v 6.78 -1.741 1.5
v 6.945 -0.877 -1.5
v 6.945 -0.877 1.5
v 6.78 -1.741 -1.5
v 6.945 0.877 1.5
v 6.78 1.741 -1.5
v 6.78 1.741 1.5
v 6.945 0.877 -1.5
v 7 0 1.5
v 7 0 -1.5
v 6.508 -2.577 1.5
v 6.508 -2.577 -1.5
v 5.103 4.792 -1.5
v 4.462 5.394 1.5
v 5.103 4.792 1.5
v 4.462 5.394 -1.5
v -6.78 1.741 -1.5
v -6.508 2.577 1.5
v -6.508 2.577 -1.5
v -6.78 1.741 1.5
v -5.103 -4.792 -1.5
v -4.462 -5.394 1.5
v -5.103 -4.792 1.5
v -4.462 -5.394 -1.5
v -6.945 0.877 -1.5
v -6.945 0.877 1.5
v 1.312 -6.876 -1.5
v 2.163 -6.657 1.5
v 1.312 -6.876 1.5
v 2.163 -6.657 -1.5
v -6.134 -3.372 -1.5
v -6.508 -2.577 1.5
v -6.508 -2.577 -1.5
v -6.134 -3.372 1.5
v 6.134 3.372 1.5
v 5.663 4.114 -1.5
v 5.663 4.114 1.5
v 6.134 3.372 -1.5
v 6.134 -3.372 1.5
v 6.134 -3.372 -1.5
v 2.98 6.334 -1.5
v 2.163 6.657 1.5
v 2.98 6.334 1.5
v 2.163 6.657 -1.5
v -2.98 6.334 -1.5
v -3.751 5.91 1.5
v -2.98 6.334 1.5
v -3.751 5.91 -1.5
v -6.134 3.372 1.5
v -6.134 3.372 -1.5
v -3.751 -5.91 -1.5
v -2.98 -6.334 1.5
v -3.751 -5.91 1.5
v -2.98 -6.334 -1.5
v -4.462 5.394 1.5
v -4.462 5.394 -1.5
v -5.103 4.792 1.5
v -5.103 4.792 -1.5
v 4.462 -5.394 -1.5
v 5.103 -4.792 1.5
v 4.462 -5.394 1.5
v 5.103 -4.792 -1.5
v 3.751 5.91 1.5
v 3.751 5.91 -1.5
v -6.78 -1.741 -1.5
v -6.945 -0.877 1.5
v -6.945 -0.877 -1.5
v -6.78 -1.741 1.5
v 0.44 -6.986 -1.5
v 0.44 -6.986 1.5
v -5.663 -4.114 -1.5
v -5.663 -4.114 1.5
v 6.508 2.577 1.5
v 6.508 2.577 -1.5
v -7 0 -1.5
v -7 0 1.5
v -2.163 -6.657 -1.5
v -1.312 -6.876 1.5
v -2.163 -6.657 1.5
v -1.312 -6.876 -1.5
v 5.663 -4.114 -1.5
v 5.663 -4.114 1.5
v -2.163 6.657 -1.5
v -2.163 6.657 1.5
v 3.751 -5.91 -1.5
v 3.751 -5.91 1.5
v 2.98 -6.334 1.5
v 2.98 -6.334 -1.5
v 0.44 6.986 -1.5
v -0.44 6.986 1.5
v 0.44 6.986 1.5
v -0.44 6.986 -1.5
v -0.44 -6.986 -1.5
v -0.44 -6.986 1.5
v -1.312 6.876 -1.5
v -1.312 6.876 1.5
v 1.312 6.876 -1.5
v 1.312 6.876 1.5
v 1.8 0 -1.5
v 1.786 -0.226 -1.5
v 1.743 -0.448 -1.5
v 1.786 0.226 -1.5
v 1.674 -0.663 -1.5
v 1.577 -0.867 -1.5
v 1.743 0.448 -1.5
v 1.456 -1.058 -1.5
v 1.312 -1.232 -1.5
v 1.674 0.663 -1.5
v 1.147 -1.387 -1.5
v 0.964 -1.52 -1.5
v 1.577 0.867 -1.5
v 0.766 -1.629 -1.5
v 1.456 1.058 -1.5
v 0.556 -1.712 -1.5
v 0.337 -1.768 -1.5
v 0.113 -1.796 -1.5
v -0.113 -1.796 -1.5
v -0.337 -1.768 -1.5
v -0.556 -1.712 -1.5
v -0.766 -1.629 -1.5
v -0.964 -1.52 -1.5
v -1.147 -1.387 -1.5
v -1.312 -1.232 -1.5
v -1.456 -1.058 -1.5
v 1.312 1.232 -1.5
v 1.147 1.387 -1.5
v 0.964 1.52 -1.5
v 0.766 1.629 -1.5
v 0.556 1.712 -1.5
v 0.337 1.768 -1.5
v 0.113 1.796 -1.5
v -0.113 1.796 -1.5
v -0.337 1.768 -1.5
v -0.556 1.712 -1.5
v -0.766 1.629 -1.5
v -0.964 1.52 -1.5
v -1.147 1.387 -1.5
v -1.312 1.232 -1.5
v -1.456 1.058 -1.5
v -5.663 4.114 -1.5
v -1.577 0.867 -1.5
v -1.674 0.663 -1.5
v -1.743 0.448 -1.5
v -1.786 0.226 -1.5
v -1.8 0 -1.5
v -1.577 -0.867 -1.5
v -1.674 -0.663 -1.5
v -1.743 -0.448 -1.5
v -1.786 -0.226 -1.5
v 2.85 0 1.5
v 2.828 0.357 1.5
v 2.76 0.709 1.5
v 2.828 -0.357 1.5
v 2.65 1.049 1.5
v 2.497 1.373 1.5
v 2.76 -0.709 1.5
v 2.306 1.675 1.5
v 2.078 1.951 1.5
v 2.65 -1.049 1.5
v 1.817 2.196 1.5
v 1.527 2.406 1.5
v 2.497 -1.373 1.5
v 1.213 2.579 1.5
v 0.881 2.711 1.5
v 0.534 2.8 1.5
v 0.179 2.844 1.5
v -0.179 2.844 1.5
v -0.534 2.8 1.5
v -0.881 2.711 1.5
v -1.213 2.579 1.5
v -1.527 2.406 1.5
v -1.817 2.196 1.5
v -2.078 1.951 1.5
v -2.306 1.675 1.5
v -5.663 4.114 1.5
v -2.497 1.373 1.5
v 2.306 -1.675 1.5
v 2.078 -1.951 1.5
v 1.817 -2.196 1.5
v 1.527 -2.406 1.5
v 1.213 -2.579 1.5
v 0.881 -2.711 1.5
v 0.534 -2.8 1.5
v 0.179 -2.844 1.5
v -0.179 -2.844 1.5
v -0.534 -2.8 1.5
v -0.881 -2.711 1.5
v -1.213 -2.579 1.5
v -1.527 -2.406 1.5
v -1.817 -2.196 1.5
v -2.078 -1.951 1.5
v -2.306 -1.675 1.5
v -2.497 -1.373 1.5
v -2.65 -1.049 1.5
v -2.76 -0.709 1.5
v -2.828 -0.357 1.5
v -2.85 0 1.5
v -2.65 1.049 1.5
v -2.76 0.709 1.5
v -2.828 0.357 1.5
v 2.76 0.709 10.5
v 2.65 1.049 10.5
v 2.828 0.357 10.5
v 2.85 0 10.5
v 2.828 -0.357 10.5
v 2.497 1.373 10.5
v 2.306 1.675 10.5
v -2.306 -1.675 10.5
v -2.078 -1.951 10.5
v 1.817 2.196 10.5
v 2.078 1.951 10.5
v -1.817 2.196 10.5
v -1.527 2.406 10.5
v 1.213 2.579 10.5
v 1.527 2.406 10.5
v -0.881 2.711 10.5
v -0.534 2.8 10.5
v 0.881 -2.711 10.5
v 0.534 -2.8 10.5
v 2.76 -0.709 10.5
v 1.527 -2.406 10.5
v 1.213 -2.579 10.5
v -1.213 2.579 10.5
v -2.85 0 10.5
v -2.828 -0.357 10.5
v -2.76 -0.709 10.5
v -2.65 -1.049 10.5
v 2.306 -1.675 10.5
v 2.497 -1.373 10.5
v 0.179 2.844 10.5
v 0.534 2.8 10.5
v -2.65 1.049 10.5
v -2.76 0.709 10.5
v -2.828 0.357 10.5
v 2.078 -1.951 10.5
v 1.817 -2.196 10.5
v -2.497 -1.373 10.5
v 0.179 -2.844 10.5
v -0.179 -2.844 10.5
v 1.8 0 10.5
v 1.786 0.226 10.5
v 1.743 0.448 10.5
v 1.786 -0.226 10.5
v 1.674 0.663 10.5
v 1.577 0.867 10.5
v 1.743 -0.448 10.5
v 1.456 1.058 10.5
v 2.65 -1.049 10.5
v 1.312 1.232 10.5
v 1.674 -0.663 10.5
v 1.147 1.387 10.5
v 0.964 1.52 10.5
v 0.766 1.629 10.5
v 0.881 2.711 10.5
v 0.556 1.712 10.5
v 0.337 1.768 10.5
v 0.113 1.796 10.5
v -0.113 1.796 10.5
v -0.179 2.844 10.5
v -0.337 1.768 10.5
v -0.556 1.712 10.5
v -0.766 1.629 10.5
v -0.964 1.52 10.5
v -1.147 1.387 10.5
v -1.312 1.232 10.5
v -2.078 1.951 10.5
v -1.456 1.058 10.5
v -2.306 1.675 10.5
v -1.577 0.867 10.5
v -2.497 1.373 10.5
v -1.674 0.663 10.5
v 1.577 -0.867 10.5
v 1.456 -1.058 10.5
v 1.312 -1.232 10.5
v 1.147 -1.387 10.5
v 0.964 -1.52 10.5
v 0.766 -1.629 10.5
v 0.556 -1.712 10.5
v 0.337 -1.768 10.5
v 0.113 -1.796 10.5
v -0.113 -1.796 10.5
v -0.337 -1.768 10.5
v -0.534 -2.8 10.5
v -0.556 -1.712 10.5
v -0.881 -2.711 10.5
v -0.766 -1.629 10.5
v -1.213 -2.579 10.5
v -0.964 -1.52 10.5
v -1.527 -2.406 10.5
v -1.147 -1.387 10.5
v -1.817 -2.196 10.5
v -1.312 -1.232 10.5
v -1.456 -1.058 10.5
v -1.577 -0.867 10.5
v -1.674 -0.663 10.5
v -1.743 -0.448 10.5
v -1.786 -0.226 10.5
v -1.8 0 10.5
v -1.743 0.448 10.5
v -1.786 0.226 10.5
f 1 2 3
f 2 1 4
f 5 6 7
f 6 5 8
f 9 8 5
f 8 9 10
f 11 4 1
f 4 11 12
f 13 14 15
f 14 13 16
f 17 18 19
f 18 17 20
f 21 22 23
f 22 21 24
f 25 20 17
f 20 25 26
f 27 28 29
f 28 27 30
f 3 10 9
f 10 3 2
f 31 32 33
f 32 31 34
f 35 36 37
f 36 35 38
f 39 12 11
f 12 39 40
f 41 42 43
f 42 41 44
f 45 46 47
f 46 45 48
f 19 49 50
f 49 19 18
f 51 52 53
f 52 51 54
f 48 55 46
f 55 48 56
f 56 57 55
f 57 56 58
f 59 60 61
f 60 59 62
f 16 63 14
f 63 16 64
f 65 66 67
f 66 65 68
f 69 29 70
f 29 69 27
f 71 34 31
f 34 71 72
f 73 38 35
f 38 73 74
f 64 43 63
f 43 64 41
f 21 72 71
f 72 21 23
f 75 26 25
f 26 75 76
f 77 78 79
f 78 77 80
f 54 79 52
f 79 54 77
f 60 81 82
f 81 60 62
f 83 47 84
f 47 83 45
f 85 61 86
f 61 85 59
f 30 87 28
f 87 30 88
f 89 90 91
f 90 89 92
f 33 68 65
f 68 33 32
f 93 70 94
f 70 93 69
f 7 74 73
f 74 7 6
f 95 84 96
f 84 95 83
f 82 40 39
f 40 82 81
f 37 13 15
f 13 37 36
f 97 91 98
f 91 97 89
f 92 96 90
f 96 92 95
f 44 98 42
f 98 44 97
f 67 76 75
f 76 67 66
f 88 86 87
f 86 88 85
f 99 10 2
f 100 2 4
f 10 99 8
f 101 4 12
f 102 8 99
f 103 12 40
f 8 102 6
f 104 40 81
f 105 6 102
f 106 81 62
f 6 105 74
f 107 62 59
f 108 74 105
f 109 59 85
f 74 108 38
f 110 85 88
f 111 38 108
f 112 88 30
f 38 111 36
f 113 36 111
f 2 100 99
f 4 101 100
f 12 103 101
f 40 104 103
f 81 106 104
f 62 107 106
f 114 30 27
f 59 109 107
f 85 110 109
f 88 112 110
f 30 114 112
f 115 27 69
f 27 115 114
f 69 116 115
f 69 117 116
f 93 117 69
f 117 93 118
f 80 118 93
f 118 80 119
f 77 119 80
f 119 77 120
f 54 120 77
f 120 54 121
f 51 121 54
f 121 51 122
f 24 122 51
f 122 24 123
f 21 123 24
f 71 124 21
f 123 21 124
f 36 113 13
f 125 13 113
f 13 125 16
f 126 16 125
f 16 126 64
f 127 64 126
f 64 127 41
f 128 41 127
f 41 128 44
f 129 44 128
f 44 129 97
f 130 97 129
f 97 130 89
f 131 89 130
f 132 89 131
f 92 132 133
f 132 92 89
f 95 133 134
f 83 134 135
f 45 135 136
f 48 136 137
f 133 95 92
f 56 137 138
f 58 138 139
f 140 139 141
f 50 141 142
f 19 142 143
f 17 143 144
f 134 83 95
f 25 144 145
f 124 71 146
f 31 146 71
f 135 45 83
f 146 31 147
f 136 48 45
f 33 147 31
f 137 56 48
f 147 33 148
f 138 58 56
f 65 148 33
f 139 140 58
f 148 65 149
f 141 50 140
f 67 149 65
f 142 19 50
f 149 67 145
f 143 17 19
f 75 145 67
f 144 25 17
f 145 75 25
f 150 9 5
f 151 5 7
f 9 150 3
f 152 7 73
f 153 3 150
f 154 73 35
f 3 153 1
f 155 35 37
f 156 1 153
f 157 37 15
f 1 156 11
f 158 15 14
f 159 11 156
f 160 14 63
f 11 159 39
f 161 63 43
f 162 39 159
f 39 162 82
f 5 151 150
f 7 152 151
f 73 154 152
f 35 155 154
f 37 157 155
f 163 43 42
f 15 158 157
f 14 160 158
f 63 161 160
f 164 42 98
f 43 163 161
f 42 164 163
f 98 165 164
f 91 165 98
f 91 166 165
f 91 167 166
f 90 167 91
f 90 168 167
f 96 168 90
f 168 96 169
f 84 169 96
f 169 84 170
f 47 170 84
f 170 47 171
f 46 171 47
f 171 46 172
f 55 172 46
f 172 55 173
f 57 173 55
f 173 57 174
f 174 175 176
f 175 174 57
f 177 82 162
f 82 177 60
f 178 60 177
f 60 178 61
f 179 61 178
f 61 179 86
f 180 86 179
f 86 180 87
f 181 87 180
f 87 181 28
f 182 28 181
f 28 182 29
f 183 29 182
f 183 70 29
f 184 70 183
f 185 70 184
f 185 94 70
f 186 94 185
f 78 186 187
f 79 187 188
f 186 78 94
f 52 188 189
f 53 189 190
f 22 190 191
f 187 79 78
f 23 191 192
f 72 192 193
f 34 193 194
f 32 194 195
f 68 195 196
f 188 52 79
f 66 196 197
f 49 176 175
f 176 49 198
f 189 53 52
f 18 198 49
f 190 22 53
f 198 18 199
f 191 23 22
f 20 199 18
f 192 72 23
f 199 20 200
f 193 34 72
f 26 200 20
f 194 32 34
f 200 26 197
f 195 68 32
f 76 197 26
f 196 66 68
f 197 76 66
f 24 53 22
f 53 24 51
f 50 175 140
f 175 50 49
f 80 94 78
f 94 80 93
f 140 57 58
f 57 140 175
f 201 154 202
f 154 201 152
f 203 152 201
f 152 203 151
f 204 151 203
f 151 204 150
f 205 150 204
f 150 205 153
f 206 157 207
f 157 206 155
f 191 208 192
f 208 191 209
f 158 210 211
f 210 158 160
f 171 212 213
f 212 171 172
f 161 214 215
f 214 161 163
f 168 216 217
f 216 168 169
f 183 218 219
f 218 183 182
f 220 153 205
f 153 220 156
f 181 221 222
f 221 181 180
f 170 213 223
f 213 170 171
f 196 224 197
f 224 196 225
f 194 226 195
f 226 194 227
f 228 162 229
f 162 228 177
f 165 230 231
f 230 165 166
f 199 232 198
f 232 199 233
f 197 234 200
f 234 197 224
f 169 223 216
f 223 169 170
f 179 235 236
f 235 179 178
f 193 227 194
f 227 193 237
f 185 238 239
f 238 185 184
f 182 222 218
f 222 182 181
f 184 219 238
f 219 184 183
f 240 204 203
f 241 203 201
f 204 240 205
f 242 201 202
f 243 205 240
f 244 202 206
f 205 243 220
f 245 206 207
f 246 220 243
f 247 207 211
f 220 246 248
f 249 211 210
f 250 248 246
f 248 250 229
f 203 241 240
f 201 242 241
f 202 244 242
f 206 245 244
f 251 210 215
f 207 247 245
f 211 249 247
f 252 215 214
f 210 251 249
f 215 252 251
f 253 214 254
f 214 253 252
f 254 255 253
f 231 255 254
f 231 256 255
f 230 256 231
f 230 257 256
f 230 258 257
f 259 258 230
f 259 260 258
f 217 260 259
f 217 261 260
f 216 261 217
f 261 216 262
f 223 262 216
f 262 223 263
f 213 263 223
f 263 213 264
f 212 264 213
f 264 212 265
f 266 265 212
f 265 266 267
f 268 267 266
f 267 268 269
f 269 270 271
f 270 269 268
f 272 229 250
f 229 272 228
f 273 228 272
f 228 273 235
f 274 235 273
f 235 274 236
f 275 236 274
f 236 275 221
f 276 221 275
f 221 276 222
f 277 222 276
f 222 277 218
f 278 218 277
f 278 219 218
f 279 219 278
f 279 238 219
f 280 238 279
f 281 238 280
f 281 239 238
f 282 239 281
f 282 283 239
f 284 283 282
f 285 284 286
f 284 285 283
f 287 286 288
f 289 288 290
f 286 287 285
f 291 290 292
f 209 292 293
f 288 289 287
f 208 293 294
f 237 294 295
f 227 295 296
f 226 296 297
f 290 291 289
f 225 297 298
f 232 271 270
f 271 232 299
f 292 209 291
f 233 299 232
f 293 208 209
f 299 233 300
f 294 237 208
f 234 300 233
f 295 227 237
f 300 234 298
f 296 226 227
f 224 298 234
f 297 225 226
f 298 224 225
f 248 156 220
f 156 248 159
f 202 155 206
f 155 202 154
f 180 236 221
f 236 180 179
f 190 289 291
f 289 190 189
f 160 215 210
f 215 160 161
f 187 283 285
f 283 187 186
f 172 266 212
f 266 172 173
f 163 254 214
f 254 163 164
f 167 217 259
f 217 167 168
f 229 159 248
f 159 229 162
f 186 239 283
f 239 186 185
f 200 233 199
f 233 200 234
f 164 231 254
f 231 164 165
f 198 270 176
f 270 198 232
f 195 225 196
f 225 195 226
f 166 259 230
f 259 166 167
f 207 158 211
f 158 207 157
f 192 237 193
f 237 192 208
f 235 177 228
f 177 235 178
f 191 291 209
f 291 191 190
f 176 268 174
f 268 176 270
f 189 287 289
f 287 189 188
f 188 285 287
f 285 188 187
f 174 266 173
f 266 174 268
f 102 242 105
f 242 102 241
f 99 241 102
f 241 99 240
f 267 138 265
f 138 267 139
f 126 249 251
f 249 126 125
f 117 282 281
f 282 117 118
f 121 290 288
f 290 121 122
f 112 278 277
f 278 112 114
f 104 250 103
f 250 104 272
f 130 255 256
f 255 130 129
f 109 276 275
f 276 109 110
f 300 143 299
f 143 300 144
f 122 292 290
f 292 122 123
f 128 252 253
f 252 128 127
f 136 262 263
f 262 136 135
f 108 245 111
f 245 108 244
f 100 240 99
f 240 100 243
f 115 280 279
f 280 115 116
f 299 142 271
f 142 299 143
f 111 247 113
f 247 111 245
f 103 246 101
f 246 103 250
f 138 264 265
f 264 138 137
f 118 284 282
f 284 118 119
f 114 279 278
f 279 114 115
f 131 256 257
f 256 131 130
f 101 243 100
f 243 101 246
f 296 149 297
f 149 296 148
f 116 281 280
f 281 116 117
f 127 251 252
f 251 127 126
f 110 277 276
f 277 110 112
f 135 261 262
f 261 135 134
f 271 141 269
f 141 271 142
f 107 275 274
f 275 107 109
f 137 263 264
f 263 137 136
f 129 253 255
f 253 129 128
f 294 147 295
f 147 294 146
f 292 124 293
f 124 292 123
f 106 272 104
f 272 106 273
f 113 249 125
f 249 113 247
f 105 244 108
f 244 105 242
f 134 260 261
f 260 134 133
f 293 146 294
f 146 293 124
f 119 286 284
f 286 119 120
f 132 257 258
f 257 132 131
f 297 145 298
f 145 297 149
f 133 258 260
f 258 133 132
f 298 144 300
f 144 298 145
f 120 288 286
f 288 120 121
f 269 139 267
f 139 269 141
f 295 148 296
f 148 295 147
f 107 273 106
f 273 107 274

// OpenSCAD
$fn = 50;


difference() {
	union() {
		translate(v = [0, 0, -1.5000000000]) {
			cylinder(h = 3, r = 7.0000000000);
		}
		translate(v = [0, 0, -1.5000000000]) {
			cylinder(h = 12, r = 2.8500000000);
		}
	}
	union() {
		translate(v = [0, 0, -50.0000000000]) {
			cylinder(h = 100, r = 1.8000000000);
		}
	}
}
